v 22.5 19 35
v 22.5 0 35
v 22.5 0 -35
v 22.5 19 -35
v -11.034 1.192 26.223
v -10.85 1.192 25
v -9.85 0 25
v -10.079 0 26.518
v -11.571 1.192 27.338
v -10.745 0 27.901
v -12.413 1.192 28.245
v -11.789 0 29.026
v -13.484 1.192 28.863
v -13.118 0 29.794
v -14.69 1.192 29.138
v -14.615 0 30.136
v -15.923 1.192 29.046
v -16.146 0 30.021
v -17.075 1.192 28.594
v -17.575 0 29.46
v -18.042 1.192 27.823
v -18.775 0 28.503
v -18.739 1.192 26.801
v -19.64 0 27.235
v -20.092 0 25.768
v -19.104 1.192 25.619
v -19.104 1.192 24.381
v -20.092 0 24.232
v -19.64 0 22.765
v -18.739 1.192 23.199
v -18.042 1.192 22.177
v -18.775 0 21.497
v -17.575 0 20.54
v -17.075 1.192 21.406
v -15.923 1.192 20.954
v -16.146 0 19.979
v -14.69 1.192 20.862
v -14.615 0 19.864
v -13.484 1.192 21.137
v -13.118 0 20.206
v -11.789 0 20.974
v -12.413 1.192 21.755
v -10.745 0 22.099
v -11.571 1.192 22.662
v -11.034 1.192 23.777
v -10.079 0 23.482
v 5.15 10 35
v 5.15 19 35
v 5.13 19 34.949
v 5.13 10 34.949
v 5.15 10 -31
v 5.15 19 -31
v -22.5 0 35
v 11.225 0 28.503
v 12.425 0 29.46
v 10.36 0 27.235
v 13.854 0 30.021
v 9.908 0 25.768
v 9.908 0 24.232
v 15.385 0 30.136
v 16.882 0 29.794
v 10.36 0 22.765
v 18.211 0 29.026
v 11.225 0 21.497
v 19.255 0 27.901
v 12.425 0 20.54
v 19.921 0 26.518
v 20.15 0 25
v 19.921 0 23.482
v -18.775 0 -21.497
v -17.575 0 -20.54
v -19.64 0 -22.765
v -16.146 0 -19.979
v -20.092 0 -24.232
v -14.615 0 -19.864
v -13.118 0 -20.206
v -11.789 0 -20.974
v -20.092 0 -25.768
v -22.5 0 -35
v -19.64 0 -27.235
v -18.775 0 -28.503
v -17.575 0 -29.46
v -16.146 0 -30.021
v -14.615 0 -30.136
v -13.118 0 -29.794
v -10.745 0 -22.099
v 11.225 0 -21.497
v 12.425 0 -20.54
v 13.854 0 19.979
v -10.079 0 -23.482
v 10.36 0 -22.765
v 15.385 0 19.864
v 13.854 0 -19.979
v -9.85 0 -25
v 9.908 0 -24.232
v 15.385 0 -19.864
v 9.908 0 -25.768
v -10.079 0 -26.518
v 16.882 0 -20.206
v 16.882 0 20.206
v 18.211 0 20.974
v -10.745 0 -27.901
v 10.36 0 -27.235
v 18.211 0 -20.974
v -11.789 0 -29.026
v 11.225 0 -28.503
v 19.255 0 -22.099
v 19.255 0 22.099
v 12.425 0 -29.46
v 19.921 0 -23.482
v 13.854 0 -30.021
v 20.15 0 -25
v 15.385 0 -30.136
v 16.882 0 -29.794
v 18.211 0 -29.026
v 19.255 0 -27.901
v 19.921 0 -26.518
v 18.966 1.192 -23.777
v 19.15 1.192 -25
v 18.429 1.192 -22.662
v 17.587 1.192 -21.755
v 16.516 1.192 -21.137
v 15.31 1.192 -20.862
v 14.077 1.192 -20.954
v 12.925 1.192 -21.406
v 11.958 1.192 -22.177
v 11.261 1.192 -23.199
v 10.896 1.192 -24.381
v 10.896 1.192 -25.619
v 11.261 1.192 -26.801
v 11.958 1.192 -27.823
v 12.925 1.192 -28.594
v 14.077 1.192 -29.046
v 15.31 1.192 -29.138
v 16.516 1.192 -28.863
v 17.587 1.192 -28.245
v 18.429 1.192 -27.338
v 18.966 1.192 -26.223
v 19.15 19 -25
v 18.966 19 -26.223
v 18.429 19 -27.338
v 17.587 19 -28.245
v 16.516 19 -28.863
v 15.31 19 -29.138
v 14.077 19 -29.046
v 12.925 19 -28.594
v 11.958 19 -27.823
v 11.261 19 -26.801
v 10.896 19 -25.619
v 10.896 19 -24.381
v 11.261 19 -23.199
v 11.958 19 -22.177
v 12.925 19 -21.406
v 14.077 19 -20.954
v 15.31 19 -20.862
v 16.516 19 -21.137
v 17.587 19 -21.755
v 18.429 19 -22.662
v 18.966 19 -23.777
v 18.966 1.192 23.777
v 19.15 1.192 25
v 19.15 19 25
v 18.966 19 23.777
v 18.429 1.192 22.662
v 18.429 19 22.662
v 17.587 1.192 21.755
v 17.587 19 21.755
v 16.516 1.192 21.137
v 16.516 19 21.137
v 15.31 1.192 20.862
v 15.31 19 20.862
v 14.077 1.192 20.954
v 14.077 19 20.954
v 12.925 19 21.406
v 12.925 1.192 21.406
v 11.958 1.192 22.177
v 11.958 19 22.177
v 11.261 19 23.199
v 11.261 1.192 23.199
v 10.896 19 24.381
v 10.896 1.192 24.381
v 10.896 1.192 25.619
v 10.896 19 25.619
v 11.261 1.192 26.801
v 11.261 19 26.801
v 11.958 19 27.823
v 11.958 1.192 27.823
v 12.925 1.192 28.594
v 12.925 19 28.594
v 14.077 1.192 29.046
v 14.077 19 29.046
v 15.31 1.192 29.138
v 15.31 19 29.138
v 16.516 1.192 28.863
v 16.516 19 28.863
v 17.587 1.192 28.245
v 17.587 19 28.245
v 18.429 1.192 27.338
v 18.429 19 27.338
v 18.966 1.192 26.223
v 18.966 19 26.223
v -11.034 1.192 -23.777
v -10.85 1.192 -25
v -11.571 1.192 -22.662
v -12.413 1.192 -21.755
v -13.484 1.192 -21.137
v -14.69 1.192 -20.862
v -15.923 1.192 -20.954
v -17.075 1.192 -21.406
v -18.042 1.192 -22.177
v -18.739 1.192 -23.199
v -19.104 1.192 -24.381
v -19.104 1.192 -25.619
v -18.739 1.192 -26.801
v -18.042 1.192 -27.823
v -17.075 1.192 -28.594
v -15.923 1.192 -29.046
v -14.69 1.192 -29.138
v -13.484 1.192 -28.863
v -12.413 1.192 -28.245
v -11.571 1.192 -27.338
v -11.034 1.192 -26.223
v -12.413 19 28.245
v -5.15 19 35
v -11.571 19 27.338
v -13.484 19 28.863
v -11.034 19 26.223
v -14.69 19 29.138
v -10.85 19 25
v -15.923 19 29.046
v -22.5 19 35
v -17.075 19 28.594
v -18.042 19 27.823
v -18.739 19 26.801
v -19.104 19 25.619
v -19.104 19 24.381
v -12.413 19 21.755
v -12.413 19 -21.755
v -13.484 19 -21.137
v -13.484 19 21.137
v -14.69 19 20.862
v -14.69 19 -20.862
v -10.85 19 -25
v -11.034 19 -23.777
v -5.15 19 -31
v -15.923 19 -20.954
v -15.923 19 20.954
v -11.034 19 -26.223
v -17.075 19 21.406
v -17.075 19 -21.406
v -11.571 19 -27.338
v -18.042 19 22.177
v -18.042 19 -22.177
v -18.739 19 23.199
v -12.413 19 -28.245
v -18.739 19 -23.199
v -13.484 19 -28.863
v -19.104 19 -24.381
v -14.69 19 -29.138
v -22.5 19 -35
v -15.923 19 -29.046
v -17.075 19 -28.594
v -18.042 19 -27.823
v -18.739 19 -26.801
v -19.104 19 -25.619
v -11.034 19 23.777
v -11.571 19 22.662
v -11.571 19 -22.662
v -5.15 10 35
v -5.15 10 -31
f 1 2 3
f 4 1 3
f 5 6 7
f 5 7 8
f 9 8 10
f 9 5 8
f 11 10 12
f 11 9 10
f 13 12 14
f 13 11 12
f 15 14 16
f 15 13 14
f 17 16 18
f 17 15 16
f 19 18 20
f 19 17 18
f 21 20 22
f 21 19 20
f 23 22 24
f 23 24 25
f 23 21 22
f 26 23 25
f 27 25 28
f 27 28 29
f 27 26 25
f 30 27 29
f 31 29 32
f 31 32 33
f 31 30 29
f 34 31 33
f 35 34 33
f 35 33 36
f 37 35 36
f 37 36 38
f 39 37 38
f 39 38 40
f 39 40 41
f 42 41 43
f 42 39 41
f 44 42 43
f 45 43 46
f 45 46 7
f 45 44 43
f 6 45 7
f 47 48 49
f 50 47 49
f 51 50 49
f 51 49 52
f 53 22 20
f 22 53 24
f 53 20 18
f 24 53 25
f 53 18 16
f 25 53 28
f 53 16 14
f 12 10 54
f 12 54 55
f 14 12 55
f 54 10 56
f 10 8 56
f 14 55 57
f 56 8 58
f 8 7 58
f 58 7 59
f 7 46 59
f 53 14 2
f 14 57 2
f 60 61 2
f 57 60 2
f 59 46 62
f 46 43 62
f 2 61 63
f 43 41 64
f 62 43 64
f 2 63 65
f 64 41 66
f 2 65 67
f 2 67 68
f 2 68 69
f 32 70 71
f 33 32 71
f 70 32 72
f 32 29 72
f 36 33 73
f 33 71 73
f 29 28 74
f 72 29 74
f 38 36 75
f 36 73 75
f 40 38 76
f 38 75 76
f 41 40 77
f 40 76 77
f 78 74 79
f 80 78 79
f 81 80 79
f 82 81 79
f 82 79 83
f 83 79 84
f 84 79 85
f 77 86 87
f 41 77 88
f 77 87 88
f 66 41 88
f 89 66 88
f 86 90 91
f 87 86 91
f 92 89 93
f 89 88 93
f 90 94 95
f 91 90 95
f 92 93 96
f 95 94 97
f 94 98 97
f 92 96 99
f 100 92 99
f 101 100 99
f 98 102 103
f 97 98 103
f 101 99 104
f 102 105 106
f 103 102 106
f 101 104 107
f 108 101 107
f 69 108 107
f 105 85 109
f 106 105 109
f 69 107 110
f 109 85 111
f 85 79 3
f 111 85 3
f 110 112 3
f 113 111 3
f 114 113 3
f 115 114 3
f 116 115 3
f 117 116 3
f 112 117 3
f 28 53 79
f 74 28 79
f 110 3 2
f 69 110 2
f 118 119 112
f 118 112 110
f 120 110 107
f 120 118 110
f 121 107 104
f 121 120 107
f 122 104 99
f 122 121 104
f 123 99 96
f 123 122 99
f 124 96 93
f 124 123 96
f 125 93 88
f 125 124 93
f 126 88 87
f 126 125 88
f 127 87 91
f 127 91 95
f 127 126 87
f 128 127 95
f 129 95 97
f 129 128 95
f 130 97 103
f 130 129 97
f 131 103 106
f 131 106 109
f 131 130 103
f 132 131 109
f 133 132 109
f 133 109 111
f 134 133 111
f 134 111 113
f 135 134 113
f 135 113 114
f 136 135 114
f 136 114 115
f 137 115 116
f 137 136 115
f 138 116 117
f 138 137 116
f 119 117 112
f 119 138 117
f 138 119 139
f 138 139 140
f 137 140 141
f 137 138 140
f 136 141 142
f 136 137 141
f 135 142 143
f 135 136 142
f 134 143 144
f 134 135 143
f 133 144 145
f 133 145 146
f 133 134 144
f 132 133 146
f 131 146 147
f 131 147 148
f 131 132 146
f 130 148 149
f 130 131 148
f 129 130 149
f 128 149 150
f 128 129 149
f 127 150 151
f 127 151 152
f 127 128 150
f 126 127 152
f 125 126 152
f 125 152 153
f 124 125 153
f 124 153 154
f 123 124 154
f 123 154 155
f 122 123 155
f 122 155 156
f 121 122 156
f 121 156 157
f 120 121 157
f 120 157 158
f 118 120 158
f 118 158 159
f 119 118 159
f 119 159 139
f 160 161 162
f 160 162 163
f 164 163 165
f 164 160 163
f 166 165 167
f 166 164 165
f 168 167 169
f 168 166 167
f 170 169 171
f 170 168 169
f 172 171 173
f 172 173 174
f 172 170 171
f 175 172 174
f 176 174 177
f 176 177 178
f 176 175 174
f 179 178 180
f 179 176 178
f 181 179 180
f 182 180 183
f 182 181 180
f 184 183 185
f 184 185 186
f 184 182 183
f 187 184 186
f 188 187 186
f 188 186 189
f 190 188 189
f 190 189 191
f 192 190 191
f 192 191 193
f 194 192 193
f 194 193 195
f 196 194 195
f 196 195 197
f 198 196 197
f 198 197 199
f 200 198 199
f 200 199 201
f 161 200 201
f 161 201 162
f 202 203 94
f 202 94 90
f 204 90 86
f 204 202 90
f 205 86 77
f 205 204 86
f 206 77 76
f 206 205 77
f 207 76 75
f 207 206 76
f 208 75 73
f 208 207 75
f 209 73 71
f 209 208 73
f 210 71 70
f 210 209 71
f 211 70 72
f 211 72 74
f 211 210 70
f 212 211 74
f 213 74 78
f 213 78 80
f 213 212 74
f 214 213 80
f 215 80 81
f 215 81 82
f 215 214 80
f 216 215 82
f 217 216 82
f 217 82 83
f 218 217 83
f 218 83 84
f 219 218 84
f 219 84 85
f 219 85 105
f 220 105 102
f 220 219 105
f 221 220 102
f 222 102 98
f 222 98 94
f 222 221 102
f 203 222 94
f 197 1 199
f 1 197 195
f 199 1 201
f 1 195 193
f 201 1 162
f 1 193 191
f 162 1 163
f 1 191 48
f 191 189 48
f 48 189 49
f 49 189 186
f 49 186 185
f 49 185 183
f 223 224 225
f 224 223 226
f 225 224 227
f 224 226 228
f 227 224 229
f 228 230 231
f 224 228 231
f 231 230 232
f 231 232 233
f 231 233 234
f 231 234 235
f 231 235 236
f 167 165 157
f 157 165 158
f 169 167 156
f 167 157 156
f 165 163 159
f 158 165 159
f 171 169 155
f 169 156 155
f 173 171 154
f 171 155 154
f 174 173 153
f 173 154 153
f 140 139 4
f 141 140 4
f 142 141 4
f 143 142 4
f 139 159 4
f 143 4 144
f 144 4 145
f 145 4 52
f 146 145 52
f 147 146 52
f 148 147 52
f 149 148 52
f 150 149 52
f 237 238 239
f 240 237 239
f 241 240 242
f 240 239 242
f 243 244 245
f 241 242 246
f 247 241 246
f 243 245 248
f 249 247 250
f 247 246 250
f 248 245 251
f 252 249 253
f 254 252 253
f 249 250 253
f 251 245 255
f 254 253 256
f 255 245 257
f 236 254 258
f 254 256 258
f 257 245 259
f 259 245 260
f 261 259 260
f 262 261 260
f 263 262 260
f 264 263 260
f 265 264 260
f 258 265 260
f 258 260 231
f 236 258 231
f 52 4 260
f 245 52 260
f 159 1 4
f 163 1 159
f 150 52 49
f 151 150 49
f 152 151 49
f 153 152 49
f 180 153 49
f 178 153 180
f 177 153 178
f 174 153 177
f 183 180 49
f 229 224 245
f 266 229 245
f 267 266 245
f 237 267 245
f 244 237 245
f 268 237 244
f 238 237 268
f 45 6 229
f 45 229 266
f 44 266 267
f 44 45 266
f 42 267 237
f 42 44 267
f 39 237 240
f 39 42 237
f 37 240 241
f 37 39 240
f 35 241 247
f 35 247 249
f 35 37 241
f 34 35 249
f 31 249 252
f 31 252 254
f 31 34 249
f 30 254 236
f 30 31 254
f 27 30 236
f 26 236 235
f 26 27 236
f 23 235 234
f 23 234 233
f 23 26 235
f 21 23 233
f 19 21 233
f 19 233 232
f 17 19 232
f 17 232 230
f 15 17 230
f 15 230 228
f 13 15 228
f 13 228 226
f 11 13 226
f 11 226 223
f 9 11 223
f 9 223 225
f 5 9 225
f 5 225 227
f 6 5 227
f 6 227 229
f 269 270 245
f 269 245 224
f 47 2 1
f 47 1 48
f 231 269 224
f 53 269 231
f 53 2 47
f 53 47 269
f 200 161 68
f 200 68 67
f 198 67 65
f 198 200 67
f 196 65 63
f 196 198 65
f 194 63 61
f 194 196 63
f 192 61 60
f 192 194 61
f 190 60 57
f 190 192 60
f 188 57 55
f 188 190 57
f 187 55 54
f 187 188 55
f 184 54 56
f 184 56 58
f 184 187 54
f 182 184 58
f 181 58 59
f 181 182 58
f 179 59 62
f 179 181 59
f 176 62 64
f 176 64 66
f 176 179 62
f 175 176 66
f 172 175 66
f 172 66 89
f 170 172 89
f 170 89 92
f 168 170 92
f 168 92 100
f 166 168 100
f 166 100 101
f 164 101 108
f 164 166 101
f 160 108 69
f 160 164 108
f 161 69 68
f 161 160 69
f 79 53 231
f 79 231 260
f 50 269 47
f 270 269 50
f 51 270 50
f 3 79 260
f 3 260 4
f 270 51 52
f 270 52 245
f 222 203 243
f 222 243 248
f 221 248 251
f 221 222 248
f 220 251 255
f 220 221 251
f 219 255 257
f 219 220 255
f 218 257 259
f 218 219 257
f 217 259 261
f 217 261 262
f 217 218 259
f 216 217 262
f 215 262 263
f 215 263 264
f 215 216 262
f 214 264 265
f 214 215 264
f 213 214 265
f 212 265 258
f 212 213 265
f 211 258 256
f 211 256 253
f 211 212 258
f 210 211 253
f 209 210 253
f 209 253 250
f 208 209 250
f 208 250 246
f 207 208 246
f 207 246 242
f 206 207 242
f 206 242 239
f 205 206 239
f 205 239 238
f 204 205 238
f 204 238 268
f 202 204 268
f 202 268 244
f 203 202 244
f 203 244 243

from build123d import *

# Parameters (mm, degrees)
SKETCH1_W           = 45
SKETCH1_H           = 70
BOSS_EXTRUDE1_DEPTH = 10
SKETCH3_R           = 4.15
CUT_EXTRUDE2_DEPTH  = 11
SKETCH5_R           = 4.15
BOSS_EXTRUDE2_DEPTH = 9
CHAMFER1_SIZE       = 1
CHAMFER1_SIZE2      = 1.191753593


with BuildPart() as part:
    # Sketch1 → Boss-Extrude1 (new body)
    with BuildSketch(Plane(origin=(0, 0, 0), x_dir=(1, 0, 0), z_dir=(0, 1, 0))):
        Rectangle(SKETCH1_W, SKETCH1_H)
    extrude(amount=BOSS_EXTRUDE1_DEPTH)

    # Sketch3 → Cut-Extrude2 (cut, through all)
    with BuildSketch(Plane.XZ):
        with Locations((15, 25)):
            Circle(SKETCH3_R)
        with Locations((15, -25)):
            Circle(SKETCH3_R)
        with Locations((-15, -25)):
            Circle(SKETCH3_R)
        with Locations((-15, 25)):
            Circle(SKETCH3_R)
    extrude(amount=-CUT_EXTRUDE2_DEPTH, mode=Mode.SUBTRACT)

    # Sketch5 → Boss-Extrude2 (add)
    with BuildSketch(Plane(origin=(0, 10, 0), x_dir=(1, 0, 0), z_dir=(0, 1, 0))):
        Polygon((-5.15, -35), (-22.5, -35), (-22.5, 35), (22.5, 35), (22.5, -35), (5.15, -35), (5.130229348, -34.949305848), (5.15, 31), (-5.15, 31), align=None)
        with Locations((-15, 25)):
            Circle(SKETCH5_R, mode=Mode.SUBTRACT)
        with Locations((15, 25)):
            Circle(SKETCH5_R, mode=Mode.SUBTRACT)
        with Locations((15, -25)):
            Circle(SKETCH5_R, mode=Mode.SUBTRACT)
        with Locations((-15, -25)):
            Circle(SKETCH5_R, mode=Mode.SUBTRACT)
    extrude(amount=BOSS_EXTRUDE2_DEPTH)

    # Chamfer1
    chamfer1_edges = [part.edges().sort_by_distance(p)[0] for p in [
        (-19.15, 0, -25),
        (-19.15, 0, 25),
        (10.85, 0, 25),
        (10.85, 0, -25),
    ]]
    chamfer1_side = [part.faces().sort_by_distance(p)[0] for p in [
        (0, 0, 0),
    ]]
    chamfer(chamfer1_edges, length=CHAMFER1_SIZE, length2=CHAMFER1_SIZE2, reference=chamfer1_side[0])


solid = part.part
